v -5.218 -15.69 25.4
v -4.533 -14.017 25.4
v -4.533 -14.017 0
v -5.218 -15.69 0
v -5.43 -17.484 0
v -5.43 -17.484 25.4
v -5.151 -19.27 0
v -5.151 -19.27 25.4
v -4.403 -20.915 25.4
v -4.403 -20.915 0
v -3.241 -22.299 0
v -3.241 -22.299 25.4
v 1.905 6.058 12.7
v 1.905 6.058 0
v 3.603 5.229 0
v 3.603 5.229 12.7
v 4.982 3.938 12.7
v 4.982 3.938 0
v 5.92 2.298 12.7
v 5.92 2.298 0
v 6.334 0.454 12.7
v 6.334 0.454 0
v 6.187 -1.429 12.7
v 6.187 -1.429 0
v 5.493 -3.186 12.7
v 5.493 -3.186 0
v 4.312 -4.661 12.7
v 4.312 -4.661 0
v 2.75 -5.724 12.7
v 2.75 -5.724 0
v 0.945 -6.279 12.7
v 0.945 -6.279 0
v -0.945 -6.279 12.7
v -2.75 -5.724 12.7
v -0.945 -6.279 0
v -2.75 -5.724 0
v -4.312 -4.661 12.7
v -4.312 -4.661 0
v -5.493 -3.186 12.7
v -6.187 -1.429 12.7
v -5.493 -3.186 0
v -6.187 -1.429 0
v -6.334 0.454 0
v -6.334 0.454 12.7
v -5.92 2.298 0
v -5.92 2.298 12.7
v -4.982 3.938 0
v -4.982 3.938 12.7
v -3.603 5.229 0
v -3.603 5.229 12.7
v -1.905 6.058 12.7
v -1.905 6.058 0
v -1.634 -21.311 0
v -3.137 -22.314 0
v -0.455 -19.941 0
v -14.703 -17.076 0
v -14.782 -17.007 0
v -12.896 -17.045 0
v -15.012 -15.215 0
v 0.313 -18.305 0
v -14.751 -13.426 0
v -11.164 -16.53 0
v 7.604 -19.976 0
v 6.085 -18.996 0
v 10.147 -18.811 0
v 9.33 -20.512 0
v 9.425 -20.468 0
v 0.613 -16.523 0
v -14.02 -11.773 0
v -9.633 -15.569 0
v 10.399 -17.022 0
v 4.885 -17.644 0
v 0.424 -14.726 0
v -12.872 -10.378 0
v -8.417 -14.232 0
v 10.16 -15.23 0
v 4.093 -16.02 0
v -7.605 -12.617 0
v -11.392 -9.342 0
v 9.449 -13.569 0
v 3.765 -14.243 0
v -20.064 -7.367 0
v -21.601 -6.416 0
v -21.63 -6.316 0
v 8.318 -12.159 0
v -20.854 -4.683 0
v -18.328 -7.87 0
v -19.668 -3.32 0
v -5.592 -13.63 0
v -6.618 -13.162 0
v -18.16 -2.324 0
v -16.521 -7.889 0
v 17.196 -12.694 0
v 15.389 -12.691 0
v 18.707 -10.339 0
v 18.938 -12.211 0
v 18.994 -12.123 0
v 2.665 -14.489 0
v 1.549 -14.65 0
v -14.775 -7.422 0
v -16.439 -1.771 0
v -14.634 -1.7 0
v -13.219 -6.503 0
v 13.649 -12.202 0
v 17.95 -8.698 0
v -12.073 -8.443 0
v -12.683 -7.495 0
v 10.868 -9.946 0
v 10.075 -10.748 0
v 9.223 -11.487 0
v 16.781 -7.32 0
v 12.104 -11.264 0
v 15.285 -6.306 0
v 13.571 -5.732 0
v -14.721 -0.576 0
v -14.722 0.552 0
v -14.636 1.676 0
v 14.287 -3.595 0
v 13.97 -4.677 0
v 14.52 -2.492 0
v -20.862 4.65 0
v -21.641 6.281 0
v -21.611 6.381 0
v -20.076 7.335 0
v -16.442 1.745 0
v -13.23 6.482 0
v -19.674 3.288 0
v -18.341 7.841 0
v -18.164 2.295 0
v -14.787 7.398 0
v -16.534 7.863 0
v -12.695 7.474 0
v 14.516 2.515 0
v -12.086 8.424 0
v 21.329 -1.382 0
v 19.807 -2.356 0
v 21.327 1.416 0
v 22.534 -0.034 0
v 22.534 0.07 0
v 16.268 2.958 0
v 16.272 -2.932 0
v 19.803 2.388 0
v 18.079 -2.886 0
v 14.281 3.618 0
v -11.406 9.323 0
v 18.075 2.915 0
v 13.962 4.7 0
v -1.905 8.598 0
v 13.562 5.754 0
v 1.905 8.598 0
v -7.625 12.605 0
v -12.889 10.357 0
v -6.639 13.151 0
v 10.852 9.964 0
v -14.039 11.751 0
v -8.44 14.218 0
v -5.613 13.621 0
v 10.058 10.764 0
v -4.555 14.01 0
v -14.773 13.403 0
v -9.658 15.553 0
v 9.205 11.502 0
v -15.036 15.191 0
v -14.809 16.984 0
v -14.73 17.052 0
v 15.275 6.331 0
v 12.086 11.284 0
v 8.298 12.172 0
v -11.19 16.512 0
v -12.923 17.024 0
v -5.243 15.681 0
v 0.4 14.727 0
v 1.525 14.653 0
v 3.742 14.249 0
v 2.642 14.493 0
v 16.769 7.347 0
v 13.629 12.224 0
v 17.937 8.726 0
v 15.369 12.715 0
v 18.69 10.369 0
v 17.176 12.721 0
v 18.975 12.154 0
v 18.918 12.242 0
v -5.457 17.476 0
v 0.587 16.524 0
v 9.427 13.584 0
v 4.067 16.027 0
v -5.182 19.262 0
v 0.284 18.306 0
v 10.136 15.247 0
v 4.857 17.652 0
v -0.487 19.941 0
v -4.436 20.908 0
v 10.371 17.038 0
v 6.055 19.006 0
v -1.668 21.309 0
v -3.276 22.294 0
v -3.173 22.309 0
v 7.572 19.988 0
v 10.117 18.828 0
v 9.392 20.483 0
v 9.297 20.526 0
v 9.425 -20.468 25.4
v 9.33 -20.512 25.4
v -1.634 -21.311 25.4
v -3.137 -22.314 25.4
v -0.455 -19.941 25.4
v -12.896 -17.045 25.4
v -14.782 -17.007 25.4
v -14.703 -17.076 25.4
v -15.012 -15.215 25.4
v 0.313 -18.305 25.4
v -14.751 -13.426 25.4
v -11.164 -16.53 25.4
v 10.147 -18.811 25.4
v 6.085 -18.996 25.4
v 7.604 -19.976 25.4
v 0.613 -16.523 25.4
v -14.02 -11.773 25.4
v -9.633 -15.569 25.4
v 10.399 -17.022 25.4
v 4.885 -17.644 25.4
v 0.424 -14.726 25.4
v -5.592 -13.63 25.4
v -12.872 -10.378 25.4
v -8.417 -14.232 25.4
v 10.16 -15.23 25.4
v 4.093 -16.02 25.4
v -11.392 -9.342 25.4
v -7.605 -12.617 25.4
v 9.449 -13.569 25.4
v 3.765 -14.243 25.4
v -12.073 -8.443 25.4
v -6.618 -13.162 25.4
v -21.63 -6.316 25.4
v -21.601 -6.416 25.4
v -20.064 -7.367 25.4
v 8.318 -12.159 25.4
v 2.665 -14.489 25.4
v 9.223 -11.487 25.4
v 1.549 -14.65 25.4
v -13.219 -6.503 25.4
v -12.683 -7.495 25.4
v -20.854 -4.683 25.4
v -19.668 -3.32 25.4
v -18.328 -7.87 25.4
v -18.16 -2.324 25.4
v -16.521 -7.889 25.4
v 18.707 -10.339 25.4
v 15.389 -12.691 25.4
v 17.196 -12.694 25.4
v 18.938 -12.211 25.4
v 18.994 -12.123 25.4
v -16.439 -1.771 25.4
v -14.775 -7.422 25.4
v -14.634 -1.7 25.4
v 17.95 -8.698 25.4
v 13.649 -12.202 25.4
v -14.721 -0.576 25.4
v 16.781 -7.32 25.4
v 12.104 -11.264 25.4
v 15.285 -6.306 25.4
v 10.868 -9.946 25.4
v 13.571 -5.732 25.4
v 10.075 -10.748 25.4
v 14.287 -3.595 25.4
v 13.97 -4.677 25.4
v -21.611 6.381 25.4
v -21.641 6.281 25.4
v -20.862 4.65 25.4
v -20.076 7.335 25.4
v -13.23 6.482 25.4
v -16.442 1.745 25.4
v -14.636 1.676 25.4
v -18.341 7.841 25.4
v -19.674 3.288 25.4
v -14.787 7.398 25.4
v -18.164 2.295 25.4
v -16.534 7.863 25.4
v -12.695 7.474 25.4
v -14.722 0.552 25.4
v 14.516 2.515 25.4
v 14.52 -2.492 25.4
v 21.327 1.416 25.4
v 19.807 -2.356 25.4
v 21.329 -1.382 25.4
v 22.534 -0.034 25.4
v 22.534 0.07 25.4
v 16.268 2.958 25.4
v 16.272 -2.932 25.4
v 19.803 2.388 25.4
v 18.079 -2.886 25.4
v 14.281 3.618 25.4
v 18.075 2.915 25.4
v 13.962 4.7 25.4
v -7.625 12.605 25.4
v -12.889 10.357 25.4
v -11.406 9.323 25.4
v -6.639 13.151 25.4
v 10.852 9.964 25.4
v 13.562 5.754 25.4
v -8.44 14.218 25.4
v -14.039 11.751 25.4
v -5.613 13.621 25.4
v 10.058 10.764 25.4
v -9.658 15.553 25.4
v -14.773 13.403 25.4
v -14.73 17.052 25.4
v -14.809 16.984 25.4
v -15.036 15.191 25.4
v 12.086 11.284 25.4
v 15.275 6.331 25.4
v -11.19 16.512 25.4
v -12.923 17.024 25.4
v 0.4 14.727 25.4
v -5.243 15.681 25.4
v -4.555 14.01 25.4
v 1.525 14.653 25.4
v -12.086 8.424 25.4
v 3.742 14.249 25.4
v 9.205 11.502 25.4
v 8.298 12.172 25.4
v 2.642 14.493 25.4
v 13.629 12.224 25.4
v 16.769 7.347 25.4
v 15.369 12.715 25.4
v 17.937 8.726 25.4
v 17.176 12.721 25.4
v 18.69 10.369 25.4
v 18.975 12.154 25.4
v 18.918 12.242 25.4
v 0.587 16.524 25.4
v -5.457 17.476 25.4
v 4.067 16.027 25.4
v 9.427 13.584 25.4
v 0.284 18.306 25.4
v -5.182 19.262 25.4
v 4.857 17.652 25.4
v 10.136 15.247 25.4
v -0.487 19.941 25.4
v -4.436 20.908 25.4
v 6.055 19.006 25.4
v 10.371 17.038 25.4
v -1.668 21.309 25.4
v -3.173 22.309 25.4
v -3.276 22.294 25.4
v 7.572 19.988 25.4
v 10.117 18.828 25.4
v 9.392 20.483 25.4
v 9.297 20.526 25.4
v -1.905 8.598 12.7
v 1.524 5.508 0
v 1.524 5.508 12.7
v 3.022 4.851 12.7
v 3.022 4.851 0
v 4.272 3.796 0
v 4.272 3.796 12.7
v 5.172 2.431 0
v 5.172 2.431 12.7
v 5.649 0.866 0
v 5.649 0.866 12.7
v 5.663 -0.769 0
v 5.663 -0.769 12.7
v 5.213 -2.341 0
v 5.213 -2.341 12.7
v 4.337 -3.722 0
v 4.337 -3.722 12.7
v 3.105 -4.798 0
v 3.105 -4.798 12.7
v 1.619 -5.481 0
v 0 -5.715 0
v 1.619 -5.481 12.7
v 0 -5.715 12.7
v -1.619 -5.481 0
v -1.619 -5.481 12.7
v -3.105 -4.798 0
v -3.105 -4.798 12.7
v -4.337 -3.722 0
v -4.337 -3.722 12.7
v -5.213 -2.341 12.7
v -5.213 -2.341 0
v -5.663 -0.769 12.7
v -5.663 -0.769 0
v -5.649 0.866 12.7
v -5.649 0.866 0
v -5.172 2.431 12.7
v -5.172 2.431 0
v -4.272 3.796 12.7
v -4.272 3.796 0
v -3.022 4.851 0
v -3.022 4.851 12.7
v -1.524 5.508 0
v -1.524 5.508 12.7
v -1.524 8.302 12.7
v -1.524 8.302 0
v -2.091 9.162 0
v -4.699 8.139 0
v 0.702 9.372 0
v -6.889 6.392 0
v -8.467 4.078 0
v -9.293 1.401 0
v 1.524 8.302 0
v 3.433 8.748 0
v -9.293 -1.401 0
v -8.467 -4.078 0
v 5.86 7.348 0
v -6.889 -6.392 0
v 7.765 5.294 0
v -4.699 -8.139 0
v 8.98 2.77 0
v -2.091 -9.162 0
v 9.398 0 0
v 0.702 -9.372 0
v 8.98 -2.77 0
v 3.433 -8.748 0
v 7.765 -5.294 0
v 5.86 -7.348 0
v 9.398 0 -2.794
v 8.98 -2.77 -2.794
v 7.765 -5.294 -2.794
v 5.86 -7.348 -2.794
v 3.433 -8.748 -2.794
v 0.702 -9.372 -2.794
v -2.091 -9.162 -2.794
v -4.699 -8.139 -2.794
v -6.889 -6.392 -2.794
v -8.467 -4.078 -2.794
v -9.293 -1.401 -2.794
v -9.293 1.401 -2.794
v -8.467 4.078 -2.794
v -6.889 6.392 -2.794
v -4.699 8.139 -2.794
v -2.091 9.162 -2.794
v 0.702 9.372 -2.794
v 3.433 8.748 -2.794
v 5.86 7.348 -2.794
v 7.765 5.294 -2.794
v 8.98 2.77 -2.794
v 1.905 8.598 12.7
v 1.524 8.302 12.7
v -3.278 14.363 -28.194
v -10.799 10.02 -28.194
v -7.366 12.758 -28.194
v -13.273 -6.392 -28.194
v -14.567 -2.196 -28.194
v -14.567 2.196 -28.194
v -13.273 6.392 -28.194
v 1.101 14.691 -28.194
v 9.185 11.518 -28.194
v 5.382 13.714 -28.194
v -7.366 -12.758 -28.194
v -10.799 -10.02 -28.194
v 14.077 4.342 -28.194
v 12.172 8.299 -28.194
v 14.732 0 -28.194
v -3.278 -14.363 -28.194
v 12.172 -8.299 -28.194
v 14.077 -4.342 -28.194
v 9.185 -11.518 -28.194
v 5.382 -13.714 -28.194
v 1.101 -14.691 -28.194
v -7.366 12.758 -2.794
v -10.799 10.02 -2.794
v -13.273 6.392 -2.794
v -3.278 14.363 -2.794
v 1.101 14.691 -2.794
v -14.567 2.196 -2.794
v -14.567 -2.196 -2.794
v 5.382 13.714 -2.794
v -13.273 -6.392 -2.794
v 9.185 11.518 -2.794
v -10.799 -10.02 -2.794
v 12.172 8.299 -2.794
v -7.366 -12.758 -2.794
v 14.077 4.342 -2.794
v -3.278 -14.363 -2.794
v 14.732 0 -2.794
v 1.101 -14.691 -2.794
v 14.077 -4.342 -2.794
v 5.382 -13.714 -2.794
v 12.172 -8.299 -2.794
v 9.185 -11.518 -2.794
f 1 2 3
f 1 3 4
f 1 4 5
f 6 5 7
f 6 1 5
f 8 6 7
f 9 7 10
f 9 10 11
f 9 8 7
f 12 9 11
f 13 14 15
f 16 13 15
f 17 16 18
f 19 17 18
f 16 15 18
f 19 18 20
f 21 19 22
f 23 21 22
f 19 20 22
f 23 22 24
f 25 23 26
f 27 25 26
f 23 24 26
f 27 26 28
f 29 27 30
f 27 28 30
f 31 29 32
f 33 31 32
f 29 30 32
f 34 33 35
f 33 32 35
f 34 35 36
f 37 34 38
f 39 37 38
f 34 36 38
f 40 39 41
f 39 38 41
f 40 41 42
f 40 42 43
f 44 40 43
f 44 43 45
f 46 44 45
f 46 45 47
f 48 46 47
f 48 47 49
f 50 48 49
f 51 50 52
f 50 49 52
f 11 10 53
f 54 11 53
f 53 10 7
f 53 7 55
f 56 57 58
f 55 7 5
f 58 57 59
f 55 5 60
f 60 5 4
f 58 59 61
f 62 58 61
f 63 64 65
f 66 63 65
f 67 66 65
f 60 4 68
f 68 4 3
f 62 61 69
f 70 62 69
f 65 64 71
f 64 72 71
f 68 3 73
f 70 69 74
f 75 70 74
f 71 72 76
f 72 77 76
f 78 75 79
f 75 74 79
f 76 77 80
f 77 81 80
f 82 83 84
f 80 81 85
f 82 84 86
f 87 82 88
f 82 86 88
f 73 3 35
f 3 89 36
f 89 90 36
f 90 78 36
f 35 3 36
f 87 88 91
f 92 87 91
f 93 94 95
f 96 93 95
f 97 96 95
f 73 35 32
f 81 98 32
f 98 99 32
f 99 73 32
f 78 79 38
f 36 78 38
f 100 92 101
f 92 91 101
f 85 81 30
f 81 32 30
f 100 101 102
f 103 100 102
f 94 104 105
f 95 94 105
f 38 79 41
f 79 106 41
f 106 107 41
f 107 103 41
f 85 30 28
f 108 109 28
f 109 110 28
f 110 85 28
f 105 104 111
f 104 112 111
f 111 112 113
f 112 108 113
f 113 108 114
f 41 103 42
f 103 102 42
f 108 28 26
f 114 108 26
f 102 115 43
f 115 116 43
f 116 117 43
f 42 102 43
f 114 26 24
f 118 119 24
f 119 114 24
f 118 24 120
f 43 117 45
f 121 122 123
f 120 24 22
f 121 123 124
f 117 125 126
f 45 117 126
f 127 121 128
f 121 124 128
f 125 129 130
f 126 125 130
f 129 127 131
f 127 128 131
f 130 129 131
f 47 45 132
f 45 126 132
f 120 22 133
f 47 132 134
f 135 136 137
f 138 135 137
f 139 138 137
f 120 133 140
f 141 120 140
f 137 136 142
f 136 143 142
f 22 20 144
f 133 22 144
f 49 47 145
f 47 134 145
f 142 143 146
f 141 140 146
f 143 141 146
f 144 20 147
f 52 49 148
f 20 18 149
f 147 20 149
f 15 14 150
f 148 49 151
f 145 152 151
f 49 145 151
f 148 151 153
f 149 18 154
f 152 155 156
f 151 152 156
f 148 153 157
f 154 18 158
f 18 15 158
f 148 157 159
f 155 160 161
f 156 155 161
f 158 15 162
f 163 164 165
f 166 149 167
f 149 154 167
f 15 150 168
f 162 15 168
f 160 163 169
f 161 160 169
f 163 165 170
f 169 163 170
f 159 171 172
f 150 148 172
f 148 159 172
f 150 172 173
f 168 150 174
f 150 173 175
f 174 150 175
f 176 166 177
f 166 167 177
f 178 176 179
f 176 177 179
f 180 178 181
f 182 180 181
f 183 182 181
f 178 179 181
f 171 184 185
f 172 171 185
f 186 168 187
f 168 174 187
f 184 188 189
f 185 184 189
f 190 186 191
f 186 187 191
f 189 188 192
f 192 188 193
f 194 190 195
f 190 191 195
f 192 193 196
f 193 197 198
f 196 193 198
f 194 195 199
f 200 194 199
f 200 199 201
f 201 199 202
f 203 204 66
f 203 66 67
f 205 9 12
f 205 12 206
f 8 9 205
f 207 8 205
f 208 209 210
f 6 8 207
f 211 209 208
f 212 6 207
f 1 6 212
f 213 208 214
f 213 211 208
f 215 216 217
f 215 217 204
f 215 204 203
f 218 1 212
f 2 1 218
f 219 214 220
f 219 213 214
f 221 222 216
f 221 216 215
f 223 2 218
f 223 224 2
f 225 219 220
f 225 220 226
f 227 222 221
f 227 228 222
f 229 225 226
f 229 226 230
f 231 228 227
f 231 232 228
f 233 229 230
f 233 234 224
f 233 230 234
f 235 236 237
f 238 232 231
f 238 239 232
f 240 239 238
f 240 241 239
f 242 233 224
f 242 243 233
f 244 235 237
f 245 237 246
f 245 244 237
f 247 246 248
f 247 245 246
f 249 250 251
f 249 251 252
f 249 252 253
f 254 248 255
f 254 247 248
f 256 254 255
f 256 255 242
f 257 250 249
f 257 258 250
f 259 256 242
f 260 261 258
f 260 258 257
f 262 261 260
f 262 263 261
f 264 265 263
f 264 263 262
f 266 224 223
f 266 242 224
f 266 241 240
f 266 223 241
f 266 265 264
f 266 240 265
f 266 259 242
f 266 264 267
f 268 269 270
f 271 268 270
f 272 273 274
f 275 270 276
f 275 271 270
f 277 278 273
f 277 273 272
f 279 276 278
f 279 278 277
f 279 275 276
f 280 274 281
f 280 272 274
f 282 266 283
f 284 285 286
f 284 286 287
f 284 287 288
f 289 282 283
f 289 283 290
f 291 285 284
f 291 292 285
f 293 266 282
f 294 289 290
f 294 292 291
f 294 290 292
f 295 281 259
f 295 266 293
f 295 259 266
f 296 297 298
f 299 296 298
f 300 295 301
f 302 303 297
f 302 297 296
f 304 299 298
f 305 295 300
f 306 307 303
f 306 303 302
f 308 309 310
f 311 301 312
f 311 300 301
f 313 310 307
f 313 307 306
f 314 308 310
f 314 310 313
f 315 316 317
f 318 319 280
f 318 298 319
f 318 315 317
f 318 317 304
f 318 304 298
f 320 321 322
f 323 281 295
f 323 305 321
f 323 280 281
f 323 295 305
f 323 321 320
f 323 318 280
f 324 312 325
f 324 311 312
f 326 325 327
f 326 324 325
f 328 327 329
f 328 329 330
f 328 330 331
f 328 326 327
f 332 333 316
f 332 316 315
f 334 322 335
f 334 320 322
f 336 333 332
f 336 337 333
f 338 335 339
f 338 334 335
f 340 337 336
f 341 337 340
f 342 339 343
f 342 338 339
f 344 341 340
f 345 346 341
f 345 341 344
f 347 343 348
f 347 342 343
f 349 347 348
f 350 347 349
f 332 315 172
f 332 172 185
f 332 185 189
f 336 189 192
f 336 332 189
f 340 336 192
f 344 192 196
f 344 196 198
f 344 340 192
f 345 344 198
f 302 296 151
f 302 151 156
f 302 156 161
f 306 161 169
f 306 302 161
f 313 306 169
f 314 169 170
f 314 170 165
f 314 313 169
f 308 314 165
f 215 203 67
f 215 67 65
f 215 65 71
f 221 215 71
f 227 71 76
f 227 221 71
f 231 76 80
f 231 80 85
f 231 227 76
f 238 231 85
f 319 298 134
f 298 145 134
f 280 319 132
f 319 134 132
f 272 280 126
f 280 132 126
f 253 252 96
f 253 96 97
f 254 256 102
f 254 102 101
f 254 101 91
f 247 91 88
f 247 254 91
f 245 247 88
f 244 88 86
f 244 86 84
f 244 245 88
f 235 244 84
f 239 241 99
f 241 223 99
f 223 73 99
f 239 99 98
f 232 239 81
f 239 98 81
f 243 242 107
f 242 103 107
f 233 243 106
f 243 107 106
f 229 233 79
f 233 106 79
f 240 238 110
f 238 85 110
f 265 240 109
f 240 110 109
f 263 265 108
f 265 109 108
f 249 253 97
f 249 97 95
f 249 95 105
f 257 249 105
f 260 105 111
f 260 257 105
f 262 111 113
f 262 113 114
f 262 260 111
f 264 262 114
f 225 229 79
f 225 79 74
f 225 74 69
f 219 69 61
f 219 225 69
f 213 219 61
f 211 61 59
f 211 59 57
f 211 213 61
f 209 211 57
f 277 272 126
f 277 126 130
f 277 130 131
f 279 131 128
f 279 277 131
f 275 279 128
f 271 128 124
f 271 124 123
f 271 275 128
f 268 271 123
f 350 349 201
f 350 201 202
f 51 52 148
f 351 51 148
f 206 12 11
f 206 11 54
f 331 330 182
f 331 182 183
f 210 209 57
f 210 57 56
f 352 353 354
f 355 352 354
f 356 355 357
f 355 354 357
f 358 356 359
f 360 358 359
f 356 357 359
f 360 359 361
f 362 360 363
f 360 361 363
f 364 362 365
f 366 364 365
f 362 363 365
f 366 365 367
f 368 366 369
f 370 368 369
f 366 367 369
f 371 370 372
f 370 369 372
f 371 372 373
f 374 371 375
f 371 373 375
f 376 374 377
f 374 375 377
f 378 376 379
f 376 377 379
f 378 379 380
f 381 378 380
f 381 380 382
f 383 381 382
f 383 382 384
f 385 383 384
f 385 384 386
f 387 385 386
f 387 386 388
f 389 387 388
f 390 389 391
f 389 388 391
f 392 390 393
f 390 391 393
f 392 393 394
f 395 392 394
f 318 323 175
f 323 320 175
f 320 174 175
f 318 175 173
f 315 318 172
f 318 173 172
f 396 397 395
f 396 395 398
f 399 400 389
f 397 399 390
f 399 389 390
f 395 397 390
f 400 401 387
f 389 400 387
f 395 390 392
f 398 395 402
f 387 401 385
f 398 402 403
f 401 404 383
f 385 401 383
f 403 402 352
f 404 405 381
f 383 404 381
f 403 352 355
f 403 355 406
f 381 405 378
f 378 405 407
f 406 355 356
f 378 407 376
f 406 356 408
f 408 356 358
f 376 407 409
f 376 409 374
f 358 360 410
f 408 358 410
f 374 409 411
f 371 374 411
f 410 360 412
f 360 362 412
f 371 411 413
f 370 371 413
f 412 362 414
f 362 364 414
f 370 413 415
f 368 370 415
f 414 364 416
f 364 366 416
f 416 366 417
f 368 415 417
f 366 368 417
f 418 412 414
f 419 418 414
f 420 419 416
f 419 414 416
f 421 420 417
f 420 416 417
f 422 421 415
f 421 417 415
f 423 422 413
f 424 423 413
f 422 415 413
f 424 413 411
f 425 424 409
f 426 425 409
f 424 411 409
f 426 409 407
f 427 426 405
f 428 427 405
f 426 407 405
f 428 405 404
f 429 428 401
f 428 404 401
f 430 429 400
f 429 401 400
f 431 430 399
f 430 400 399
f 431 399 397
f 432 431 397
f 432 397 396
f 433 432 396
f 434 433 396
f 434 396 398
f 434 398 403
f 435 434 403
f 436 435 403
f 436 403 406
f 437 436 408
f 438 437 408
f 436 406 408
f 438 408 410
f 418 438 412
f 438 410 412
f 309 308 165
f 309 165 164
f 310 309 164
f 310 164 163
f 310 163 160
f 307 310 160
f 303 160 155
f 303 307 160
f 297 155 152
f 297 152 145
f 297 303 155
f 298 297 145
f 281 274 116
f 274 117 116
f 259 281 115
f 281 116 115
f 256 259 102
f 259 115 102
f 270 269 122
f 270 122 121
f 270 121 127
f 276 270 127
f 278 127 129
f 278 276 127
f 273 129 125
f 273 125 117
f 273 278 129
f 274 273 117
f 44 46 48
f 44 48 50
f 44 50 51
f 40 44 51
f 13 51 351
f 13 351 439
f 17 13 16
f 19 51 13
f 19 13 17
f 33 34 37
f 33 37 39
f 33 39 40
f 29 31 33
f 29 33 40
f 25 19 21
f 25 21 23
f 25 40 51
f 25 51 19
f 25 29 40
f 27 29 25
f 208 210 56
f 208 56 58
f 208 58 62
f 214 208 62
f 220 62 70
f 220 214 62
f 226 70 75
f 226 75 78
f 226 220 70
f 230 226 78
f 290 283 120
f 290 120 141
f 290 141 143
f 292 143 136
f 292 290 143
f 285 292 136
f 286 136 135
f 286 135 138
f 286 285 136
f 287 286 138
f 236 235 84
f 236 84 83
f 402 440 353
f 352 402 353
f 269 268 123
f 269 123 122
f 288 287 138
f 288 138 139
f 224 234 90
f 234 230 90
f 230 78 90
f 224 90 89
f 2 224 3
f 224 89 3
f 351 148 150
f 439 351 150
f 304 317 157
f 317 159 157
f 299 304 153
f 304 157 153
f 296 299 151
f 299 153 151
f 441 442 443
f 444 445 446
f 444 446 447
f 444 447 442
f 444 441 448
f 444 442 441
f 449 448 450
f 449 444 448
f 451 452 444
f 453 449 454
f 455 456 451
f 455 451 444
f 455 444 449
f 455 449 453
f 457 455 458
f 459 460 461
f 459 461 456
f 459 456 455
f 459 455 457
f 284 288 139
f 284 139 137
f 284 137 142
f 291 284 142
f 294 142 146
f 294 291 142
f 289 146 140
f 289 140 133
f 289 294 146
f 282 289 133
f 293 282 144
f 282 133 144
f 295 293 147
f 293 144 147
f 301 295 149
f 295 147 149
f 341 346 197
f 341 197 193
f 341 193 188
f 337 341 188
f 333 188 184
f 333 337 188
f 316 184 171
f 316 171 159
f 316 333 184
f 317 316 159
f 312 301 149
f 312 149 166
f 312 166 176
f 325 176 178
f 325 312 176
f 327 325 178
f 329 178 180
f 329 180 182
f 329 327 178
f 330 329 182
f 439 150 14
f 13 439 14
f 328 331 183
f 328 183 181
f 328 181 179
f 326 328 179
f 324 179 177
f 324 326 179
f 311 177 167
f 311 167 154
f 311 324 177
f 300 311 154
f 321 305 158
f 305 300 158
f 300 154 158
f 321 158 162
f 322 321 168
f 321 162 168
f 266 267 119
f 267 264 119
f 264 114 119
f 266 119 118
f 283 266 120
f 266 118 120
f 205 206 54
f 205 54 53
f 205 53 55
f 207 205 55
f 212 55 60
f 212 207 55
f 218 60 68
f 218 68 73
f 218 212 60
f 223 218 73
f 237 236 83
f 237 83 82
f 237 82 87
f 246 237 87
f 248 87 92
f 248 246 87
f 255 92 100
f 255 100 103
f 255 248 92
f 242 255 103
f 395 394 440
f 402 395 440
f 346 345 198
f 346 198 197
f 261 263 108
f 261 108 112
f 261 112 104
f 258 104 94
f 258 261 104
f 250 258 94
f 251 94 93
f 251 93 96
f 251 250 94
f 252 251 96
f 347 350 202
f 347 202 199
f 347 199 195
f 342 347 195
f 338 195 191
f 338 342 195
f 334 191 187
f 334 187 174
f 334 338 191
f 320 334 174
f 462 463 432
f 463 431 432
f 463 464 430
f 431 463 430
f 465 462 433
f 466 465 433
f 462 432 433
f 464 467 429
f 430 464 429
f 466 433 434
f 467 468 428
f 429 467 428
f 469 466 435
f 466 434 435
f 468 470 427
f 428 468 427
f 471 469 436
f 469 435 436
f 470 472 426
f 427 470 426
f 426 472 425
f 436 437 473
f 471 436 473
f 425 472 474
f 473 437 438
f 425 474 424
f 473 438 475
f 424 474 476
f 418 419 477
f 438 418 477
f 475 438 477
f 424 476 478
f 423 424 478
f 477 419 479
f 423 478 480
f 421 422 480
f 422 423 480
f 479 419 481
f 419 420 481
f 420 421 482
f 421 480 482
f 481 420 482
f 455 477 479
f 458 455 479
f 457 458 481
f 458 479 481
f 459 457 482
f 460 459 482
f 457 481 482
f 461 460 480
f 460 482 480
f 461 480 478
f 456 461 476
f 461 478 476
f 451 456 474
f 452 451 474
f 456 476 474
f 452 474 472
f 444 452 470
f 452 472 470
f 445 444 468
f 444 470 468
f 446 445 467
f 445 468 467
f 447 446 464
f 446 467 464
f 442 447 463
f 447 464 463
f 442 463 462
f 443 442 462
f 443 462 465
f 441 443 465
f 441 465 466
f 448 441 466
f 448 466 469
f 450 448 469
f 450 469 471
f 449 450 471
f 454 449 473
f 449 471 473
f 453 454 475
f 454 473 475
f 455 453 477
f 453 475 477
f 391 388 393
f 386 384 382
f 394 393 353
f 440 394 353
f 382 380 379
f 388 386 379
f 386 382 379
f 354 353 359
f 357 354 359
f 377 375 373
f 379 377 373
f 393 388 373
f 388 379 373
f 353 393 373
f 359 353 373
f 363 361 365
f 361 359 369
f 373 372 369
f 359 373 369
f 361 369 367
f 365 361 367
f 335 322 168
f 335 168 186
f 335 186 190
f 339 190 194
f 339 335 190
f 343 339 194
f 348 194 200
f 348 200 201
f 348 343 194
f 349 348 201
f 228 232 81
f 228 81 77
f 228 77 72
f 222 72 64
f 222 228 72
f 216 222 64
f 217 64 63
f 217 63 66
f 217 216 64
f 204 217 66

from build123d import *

# Parameters (mm, degrees)
F0_R      = 14.732
F1_DEPTH  = 25.4
F3_DEPTH  = 25.4
F4_COUNT  = 11
F6_DEPTH  = 12.7
F8_DEPTH  = 12.7
F9_R      = 9.398
F10_DEPTH = 2.794
F11_R     = 14.732
F12_DEPTH = 25.4


with BuildPart() as f1:
    # F0 (on Top) → F1 (new body)
    with BuildSketch(Plane.XY):
        Circle(F0_R)
    extrude(amount=F1_DEPTH)

    # F2 (on face) → F3 (join, through all)
    with BuildSketch(Plane.XY.offset(25.4)):
        with BuildLine():
            Line((-4.5369443263, 13.978875159), (0.3913960902, 14.6914813287))
            ThreePointArc((0.3913960902, 14.6914813287), (-0.0382185694, 19.133161975), (-3.1729441601, 22.3091013936))
            Line((-3.1729441601, 22.3091013936), (-3.2763966599, 22.2941428308))
            ThreePointArc((-3.2763966599, 22.2941428308), (-5.3830975977, 18.3603270143), (-4.5369443263, 13.978875159))
        make_face()
    extrude(amount=-F3_DEPTH)

    # F4: F1 ×11 about axis
    f4_axis = Axis((0, 0, 25.4), (0, 0, -1))


with BuildPart() as f1_1:
    add(f1.part)
    for i in range(1, F4_COUNT):
        add(f1.part.rotate(f4_axis, i * 360 / F4_COUNT))

    # F5 (on face) → F6 (cut)
    with BuildSketch(Plane(origin=(0, 0, 0), x_dir=(1, 0, 0), z_dir=(0, 0, -1))):
        with BuildLine():
            Line((1.905, -8.597513929), (1.905, -6.057513929))
            ThreePointArc((1.905, -6.057513929), (0, 6.35), (-1.905, -6.057513929))
            Line((-1.905, -6.057513929), (-1.905, -8.597513929))
            Line((-1.905, -8.597513929), (1.905, -8.597513929))
        make_face()
    extrude(amount=-F6_DEPTH, mode=Mode.SUBTRACT)


with BuildPart() as f8:
    # F7 (on face) → F8 (new body, through all)
    with BuildSketch(Plane(origin=(0, 0, 12.7), x_dir=(1, 0, 0), z_dir=(0, 0, -1))):
        with BuildLine():
            Line((1.524, -8.3020531043), (1.524, -5.5080531043))
            ThreePointArc((1.524, -5.5080531043), (0, 5.715), (-1.524, -5.5080531043))
            Line((-1.524, -5.5080531043), (-1.524, -8.3020531043))
            Line((-1.524, -8.3020531043), (1.524, -8.3020531043))
        make_face()
    extrude(amount=F8_DEPTH)

    # F9 (on face) → F10 (join)
    with BuildSketch(Plane(origin=(0, 0, 0), x_dir=(1, 0, 0), z_dir=(0, 0, -1))):
        Circle(F9_R)
    extrude(amount=F10_DEPTH)

    # F11 (on face) → F12 (join)
    with BuildSketch(Plane(origin=(0, 0, -2.794), x_dir=(1, 0, 0), z_dir=(0, 0, -1))):
        Circle(F11_R)
    extrude(amount=F12_DEPTH)


solid = Compound([f1_1.part, f8.part])
